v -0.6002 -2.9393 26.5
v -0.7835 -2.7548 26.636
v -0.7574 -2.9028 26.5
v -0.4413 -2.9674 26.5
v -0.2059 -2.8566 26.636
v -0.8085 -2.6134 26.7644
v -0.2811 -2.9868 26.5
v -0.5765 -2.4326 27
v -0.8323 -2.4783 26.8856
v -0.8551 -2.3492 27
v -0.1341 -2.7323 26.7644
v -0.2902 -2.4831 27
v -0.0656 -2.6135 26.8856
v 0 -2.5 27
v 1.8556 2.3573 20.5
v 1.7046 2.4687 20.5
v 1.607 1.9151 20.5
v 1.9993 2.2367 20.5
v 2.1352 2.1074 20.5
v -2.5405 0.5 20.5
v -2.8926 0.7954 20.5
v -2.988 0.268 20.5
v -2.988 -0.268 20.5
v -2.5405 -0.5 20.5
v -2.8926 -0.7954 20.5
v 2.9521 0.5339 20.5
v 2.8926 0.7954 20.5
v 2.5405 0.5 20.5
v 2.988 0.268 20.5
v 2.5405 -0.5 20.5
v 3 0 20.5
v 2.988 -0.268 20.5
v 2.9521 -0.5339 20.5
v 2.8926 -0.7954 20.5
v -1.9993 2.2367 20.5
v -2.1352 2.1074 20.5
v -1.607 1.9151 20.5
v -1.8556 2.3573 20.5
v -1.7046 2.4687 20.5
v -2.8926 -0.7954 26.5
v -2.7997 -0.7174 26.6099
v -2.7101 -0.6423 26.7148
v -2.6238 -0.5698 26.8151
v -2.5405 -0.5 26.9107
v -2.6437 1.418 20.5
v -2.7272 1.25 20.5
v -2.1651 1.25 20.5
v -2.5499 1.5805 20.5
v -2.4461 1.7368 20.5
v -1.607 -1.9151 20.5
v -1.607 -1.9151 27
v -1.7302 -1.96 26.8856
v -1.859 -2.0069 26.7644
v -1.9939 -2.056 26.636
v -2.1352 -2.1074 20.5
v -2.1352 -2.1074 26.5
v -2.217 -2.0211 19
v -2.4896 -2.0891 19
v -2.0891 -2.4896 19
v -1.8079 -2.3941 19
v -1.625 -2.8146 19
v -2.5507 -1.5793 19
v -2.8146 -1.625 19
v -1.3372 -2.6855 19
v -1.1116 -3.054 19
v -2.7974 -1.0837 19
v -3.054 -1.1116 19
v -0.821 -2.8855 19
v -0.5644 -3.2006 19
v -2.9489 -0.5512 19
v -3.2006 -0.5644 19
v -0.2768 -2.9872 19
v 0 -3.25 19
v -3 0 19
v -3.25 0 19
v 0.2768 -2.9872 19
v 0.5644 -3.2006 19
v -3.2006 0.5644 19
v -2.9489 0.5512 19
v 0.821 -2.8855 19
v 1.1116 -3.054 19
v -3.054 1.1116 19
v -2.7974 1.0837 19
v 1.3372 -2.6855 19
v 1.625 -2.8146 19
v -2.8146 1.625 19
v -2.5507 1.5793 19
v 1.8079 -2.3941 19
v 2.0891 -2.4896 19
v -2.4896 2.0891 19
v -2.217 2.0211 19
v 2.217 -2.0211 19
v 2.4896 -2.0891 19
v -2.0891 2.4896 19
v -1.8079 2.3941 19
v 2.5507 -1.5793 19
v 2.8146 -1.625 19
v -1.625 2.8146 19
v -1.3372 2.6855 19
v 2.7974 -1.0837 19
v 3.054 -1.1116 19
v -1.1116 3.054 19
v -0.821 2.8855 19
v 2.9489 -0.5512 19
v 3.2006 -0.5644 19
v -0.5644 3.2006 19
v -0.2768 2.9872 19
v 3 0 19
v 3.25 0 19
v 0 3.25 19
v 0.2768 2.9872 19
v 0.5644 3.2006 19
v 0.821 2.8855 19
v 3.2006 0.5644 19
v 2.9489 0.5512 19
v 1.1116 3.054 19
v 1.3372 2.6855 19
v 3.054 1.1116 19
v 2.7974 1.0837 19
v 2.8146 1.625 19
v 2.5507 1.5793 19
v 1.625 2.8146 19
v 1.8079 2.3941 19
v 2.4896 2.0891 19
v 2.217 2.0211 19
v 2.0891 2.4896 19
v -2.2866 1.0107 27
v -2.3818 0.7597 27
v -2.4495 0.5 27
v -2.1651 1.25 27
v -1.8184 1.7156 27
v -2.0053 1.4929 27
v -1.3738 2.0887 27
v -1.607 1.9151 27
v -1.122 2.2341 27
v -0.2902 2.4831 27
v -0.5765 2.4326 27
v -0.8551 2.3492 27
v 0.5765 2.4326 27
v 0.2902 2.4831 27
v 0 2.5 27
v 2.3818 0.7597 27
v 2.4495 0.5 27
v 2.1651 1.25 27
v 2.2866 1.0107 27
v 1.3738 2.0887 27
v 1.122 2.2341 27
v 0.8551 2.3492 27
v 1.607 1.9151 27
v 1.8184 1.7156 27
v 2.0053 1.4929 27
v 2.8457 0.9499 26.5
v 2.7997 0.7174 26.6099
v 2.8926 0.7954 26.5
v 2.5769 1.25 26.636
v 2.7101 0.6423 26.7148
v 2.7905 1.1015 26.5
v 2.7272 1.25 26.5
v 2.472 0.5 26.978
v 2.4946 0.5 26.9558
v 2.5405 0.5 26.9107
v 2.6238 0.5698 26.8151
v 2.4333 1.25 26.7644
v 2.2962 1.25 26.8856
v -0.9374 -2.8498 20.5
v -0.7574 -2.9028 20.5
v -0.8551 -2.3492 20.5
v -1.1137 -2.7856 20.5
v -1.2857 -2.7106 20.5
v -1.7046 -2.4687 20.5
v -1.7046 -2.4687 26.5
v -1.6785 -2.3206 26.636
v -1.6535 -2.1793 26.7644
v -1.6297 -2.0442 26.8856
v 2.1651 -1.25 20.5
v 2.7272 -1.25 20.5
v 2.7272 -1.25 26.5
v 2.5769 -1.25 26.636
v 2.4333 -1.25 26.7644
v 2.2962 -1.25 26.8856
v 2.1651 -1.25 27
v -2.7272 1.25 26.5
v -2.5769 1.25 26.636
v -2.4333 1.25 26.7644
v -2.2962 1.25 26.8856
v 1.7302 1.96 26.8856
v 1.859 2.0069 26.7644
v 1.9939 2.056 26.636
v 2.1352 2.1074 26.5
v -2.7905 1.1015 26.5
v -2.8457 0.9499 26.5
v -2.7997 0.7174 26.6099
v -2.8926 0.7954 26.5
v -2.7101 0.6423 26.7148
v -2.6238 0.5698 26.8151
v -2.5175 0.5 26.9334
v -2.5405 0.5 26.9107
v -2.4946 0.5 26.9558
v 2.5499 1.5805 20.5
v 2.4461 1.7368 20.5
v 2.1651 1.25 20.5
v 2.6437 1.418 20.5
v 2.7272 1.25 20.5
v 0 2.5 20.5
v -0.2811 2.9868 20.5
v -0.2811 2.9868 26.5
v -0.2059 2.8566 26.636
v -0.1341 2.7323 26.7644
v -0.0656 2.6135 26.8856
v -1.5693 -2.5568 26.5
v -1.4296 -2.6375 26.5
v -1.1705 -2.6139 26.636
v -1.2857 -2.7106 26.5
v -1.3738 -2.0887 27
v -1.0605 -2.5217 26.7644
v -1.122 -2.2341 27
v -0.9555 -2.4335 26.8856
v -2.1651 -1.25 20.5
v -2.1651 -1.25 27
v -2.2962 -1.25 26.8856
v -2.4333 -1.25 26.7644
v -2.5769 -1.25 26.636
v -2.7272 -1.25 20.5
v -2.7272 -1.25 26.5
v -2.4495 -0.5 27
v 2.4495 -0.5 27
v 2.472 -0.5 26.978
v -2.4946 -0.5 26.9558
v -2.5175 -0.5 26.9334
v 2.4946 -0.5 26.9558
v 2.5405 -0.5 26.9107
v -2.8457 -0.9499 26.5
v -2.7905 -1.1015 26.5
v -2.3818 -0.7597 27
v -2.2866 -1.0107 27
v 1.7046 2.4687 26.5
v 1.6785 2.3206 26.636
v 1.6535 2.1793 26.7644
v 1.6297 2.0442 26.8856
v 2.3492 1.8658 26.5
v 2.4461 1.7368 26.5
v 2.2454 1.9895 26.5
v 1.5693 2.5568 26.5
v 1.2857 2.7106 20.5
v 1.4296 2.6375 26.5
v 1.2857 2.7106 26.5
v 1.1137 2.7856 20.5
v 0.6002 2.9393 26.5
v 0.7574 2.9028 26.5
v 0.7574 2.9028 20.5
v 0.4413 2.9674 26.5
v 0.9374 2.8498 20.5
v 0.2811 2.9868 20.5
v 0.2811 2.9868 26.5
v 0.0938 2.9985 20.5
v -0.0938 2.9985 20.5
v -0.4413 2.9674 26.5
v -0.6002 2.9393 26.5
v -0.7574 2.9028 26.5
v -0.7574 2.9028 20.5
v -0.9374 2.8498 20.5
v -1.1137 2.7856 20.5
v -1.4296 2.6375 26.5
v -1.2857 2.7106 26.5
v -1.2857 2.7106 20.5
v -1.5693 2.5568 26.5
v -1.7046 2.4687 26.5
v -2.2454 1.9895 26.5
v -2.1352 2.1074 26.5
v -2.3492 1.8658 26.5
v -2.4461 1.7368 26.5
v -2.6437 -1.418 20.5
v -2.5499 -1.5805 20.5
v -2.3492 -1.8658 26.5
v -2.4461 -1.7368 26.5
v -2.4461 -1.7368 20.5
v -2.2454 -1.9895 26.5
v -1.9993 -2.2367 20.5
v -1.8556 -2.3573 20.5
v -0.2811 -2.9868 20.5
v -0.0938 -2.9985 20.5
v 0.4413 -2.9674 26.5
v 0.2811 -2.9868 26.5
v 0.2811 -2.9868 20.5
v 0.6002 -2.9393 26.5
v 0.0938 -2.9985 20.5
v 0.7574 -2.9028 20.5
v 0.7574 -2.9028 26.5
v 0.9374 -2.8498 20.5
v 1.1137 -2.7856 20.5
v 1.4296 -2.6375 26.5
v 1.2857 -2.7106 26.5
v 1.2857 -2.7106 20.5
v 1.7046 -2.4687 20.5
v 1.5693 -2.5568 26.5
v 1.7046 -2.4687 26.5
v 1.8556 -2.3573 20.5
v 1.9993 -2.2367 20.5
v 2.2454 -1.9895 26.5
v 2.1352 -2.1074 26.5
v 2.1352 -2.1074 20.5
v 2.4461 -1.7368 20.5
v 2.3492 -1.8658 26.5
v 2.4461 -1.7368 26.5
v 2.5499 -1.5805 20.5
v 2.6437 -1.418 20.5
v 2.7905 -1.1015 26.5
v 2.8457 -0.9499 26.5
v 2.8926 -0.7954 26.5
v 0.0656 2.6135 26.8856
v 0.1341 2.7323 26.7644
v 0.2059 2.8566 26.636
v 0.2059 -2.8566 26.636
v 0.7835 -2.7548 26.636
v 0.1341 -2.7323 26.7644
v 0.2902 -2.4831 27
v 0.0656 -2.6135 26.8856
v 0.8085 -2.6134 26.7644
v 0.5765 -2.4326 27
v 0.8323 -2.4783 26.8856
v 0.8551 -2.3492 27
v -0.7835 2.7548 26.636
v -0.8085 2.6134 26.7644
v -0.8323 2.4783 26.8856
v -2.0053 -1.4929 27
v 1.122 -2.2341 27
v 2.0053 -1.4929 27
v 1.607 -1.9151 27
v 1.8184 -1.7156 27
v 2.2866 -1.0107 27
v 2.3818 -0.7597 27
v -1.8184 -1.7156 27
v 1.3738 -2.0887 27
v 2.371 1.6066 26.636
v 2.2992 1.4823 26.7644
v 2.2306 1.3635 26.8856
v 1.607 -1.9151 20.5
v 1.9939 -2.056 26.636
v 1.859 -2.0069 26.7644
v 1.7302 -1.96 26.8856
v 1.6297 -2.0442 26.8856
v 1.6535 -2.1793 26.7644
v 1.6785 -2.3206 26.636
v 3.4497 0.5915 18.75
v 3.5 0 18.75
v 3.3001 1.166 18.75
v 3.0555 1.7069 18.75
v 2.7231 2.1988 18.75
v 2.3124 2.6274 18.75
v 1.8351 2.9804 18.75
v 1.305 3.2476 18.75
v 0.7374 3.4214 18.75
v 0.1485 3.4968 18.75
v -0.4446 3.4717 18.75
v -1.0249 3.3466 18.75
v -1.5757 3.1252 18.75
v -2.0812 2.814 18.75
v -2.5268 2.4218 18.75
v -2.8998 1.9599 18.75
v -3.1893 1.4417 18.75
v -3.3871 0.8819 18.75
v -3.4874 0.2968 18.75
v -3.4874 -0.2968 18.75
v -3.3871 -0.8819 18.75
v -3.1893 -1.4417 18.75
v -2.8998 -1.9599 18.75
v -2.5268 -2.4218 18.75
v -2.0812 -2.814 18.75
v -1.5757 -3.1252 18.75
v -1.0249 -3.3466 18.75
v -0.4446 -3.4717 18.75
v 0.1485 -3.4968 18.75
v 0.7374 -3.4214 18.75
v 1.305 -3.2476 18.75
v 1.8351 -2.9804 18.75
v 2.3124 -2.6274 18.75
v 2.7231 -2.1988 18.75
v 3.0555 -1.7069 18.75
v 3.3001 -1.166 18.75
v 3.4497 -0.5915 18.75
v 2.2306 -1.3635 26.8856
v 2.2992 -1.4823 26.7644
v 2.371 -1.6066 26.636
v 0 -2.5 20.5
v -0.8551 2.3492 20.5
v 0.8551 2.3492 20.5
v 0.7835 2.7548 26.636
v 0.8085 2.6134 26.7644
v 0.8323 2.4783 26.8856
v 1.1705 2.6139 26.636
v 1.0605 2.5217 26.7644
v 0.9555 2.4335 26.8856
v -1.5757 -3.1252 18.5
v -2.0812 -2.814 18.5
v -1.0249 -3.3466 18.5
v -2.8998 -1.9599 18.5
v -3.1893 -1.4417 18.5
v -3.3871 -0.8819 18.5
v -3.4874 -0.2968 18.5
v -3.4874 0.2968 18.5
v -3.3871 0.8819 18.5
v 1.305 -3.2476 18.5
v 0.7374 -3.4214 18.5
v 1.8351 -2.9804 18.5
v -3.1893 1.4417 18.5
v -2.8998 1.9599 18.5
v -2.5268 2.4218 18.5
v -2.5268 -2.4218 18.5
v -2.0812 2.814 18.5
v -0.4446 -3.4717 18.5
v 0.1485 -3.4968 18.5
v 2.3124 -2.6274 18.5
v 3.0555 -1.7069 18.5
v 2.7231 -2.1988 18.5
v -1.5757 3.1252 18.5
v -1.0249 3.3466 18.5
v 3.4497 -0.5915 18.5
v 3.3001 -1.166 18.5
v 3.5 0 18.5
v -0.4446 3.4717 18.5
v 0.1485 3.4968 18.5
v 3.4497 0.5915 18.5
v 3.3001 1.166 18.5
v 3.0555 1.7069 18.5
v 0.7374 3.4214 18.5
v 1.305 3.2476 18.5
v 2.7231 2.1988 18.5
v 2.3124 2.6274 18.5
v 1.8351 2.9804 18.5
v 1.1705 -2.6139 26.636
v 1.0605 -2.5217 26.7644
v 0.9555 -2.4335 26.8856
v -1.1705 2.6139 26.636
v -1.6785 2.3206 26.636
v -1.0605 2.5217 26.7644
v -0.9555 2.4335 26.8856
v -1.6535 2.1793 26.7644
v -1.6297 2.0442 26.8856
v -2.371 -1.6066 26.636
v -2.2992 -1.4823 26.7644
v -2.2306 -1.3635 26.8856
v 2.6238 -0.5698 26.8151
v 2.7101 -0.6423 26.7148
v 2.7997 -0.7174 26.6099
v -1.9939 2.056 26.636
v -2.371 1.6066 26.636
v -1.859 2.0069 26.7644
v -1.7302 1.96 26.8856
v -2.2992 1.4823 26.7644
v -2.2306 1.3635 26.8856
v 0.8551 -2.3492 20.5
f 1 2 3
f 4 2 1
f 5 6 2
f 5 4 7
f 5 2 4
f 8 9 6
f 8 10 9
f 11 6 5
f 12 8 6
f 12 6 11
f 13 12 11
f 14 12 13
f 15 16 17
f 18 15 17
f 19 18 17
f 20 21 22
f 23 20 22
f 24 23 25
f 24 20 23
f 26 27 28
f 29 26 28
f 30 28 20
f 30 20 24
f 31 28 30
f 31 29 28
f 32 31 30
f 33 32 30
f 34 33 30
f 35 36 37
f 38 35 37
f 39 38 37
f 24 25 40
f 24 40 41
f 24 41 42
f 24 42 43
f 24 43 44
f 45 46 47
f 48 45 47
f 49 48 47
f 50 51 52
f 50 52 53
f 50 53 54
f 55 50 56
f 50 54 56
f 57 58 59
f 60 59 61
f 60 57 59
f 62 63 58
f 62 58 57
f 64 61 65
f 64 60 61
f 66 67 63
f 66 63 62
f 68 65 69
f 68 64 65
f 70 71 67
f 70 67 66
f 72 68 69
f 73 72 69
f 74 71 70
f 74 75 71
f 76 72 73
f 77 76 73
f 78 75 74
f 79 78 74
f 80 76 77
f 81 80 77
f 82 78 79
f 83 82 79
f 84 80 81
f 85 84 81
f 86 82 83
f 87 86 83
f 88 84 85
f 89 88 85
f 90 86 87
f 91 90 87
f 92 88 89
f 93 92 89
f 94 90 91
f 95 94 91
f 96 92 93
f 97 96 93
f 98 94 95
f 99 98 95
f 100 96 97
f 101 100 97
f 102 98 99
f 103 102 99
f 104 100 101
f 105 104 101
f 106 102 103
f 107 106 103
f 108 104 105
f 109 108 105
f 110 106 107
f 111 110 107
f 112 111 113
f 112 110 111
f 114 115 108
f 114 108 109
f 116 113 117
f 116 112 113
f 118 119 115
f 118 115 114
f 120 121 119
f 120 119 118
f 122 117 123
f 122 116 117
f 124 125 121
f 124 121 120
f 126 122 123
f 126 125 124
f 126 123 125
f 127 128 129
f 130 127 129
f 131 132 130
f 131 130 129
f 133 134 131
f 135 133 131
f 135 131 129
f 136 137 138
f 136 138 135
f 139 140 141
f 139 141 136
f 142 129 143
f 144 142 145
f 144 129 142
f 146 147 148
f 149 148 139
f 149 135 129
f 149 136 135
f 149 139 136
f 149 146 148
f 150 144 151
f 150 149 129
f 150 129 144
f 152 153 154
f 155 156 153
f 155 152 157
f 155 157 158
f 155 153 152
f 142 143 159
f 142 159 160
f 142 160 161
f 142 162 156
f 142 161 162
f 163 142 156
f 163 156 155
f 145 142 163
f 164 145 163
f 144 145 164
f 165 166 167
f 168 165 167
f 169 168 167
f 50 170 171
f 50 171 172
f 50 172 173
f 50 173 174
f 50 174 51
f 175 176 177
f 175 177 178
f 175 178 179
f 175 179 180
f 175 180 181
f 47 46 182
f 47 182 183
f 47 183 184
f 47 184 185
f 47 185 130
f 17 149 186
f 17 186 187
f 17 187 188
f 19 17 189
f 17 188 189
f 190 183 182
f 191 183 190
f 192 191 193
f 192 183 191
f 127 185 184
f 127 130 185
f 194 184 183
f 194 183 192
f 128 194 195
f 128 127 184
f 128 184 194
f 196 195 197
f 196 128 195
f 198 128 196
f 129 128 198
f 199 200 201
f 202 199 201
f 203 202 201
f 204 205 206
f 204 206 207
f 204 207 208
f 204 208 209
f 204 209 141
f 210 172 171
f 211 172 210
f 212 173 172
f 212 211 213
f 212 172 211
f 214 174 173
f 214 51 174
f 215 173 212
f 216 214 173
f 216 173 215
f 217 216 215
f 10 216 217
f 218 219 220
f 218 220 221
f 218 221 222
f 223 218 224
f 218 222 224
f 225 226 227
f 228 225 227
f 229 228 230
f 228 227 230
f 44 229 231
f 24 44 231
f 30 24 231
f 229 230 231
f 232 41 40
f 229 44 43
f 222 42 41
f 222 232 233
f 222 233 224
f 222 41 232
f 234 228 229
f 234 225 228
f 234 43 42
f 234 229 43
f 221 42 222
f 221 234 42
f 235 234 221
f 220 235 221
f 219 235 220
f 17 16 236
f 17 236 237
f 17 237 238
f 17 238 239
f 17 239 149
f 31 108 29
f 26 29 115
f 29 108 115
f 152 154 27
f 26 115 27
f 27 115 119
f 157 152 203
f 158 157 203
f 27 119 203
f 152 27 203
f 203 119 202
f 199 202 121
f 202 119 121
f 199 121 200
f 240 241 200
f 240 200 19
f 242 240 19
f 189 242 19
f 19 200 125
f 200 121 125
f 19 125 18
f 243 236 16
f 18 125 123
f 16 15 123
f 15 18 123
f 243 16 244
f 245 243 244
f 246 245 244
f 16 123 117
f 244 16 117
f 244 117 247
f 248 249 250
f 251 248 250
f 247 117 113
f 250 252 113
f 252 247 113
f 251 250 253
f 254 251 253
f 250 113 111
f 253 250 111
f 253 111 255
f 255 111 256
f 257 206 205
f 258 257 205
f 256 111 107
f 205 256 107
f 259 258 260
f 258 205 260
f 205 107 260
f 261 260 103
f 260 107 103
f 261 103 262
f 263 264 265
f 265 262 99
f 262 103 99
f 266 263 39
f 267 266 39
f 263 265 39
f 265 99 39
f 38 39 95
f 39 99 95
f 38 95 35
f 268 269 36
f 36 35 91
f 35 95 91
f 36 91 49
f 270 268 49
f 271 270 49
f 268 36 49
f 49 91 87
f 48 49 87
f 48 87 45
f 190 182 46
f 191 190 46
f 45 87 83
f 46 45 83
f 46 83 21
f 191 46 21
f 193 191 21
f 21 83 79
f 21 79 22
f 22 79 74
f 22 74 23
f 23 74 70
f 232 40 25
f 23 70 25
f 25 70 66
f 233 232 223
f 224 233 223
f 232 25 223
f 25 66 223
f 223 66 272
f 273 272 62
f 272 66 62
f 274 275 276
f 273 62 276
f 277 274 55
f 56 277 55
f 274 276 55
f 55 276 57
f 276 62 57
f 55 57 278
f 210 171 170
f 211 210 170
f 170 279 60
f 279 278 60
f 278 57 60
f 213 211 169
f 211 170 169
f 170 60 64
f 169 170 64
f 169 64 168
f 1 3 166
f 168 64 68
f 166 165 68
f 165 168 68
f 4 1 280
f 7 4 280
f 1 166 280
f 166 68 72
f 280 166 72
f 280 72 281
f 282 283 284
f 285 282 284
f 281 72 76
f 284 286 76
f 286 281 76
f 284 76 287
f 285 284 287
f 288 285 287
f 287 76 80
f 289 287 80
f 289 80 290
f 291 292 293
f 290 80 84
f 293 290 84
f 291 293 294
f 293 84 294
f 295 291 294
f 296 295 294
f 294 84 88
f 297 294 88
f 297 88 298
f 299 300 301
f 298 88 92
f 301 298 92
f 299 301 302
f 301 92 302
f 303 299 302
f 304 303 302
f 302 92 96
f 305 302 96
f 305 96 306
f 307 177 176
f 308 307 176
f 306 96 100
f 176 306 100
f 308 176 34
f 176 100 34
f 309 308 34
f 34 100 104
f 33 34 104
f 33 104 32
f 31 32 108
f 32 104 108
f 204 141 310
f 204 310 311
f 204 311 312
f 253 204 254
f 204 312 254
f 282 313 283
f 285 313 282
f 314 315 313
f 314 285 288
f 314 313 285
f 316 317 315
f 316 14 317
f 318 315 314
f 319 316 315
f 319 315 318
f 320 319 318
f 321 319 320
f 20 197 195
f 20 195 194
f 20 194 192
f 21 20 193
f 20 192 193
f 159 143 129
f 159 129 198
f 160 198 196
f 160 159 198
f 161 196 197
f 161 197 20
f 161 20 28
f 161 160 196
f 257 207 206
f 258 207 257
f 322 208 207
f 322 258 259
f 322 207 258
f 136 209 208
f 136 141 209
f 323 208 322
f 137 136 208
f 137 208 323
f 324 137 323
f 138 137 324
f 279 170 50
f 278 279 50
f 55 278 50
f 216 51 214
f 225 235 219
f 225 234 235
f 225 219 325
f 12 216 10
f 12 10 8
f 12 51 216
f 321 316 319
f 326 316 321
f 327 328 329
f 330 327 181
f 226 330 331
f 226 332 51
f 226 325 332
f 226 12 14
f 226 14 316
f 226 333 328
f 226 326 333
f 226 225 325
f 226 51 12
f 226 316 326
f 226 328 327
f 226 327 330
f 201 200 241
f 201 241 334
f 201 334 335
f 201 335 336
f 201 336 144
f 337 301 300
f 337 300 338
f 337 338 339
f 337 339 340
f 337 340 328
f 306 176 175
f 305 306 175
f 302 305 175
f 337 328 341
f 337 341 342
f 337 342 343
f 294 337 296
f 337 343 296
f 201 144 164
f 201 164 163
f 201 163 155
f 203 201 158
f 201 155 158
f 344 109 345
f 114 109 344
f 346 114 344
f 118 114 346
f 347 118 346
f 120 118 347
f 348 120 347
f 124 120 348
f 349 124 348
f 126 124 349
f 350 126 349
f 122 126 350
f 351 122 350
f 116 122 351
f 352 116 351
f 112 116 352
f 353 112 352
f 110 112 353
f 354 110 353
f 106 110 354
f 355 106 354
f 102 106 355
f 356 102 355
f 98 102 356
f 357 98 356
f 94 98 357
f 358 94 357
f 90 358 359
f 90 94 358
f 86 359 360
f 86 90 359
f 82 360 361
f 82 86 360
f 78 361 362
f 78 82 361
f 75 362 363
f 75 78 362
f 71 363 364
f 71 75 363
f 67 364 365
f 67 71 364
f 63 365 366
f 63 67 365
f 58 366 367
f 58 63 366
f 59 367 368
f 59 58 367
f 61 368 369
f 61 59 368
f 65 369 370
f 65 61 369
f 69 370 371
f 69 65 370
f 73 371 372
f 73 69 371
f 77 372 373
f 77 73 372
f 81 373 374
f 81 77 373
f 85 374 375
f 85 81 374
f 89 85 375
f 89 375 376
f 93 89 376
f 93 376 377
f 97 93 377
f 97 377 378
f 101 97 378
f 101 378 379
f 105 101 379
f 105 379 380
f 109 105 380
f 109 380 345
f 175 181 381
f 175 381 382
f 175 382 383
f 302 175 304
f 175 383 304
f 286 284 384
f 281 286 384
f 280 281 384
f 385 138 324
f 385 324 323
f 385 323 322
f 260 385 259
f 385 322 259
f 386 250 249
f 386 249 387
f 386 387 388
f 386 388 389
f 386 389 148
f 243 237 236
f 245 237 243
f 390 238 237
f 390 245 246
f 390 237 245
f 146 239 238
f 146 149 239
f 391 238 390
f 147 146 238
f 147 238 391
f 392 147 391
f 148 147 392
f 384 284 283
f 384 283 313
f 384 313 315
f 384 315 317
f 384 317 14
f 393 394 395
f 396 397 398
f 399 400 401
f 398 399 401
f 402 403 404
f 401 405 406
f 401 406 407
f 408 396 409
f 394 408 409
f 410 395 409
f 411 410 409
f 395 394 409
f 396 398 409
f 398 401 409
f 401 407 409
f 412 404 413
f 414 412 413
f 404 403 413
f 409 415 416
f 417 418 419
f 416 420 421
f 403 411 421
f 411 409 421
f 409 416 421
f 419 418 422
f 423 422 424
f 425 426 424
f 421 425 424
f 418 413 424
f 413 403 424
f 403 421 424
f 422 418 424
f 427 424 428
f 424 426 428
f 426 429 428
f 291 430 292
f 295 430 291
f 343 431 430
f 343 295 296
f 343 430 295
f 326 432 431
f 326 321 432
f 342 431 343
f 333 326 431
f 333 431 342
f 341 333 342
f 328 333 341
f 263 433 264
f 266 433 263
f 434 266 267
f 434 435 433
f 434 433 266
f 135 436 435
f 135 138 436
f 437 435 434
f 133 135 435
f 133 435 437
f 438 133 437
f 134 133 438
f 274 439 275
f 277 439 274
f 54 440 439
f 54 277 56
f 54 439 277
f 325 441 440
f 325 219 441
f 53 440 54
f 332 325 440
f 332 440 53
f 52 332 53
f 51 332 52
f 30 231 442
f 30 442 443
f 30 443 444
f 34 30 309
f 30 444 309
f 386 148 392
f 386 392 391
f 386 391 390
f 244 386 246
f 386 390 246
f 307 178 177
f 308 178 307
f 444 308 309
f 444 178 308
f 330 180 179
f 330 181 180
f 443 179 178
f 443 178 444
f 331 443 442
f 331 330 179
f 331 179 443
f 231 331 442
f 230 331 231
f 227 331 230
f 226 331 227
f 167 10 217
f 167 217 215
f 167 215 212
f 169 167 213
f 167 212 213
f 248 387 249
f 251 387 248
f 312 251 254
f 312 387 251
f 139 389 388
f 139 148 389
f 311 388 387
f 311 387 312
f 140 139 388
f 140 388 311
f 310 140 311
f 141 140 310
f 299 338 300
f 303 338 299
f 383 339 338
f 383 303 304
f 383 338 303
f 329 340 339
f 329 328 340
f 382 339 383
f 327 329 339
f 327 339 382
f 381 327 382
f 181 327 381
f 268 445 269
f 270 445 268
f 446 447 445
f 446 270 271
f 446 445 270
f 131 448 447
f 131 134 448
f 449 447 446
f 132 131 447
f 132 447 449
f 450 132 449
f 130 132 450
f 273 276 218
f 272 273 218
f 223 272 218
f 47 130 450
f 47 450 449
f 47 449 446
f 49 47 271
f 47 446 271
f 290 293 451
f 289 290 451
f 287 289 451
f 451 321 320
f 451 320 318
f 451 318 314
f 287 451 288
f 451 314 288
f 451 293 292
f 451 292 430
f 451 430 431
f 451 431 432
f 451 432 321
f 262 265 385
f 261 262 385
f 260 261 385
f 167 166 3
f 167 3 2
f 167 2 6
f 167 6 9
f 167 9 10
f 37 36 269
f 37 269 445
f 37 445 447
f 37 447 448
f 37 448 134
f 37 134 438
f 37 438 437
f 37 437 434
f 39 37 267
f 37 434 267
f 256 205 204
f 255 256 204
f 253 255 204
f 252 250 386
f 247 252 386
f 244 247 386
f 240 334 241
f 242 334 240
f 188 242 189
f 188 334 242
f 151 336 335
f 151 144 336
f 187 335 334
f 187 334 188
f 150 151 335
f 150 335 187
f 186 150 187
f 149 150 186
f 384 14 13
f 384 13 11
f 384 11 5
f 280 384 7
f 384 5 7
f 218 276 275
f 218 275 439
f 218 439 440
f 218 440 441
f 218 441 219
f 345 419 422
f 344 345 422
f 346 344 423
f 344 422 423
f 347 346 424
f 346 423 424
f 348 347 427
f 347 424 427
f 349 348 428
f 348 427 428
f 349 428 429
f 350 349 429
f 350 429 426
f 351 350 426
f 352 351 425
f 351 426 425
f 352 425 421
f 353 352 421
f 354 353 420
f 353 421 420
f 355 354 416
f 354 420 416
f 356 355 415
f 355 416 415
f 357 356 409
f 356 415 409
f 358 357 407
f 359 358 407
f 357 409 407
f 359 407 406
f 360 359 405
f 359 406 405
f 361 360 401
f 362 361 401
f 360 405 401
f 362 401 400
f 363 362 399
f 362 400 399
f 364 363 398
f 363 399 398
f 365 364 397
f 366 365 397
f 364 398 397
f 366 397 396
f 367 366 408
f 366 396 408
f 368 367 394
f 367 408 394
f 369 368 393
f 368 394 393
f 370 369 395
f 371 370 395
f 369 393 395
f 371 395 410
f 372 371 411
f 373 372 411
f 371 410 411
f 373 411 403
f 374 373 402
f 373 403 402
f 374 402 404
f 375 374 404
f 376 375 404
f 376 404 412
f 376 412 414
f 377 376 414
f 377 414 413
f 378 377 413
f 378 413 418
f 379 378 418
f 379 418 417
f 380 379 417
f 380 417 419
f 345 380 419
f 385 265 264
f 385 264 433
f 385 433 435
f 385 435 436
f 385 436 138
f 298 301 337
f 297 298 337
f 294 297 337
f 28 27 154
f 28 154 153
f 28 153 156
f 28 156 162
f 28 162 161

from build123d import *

# Parameters (mm, degrees)
SKETCH009_R           = 3.5
PAD006_DEPTH          = 0.5
CHAMFER001_SIZE       = 0.25
SKETCH010_R           = 3
PAD007_DEPTH          = 8
CHAMFER002_SIZE       = 0.5
POCKET002_DEPTH       = 6.5
POLARPATTERN002_COUNT = 18
SKETCH012_W           = 6.5
SKETCH012_H           = 1
POCKET003_DEPTH       = 6.5


with BuildPart() as part:
    # Sketch009 → Pad006 (new body)
    with BuildSketch(Plane.XY.offset(18.5)):
        Circle(SKETCH009_R)
    extrude(amount=PAD006_DEPTH)

    # Chamfer001
    chamfer001_edges = [part.edges().sort_by_distance(p)[0] for p in [
        (-3.5, 0, 19),
    ]]
    chamfer(chamfer001_edges, length=CHAMFER001_SIZE)

    # Sketch010 (on Face4 of Chamfer001) → Pad007 (join)
    with BuildSketch(Plane.XY.offset(19)):
        Circle(SKETCH010_R)
    extrude(amount=PAD007_DEPTH)

    # Chamfer002
    chamfer002_edges = [part.edges().sort_by_distance(p)[0] for p in [
        (-3, 0, 27),
    ]]
    chamfer(chamfer002_edges, length=CHAMFER002_SIZE)

    # Sketch011 (on Face6 of Pad007) → Pocket002 (cut)
    with BuildSketch(Plane.XY.offset(27)):
        Polygon((0, 2.5), (0.433013, 3.25), (-0.433013, 3.25), align=None)
    pocket002 = extrude(amount=-POCKET002_DEPTH, mode=Mode.SUBTRACT)

    # PolarPattern002: Pocket002 ×18 about axis
    polarpattern002_axis = Axis((0, 0, 27), (0, 0, 1))
    for i in range(1, POLARPATTERN002_COUNT):
        add(pocket002.rotate(polarpattern002_axis, i * 360 / POLARPATTERN002_COUNT), mode=Mode.SUBTRACT)

    # Sketch012 (on Face76 of PolarPattern002) → Pocket003 (cut)
    with BuildSketch(Plane.XY.offset(27)):
        Rectangle(SKETCH012_W, SKETCH012_H)
    extrude(amount=-POCKET003_DEPTH, mode=Mode.SUBTRACT)


solid = part.part
